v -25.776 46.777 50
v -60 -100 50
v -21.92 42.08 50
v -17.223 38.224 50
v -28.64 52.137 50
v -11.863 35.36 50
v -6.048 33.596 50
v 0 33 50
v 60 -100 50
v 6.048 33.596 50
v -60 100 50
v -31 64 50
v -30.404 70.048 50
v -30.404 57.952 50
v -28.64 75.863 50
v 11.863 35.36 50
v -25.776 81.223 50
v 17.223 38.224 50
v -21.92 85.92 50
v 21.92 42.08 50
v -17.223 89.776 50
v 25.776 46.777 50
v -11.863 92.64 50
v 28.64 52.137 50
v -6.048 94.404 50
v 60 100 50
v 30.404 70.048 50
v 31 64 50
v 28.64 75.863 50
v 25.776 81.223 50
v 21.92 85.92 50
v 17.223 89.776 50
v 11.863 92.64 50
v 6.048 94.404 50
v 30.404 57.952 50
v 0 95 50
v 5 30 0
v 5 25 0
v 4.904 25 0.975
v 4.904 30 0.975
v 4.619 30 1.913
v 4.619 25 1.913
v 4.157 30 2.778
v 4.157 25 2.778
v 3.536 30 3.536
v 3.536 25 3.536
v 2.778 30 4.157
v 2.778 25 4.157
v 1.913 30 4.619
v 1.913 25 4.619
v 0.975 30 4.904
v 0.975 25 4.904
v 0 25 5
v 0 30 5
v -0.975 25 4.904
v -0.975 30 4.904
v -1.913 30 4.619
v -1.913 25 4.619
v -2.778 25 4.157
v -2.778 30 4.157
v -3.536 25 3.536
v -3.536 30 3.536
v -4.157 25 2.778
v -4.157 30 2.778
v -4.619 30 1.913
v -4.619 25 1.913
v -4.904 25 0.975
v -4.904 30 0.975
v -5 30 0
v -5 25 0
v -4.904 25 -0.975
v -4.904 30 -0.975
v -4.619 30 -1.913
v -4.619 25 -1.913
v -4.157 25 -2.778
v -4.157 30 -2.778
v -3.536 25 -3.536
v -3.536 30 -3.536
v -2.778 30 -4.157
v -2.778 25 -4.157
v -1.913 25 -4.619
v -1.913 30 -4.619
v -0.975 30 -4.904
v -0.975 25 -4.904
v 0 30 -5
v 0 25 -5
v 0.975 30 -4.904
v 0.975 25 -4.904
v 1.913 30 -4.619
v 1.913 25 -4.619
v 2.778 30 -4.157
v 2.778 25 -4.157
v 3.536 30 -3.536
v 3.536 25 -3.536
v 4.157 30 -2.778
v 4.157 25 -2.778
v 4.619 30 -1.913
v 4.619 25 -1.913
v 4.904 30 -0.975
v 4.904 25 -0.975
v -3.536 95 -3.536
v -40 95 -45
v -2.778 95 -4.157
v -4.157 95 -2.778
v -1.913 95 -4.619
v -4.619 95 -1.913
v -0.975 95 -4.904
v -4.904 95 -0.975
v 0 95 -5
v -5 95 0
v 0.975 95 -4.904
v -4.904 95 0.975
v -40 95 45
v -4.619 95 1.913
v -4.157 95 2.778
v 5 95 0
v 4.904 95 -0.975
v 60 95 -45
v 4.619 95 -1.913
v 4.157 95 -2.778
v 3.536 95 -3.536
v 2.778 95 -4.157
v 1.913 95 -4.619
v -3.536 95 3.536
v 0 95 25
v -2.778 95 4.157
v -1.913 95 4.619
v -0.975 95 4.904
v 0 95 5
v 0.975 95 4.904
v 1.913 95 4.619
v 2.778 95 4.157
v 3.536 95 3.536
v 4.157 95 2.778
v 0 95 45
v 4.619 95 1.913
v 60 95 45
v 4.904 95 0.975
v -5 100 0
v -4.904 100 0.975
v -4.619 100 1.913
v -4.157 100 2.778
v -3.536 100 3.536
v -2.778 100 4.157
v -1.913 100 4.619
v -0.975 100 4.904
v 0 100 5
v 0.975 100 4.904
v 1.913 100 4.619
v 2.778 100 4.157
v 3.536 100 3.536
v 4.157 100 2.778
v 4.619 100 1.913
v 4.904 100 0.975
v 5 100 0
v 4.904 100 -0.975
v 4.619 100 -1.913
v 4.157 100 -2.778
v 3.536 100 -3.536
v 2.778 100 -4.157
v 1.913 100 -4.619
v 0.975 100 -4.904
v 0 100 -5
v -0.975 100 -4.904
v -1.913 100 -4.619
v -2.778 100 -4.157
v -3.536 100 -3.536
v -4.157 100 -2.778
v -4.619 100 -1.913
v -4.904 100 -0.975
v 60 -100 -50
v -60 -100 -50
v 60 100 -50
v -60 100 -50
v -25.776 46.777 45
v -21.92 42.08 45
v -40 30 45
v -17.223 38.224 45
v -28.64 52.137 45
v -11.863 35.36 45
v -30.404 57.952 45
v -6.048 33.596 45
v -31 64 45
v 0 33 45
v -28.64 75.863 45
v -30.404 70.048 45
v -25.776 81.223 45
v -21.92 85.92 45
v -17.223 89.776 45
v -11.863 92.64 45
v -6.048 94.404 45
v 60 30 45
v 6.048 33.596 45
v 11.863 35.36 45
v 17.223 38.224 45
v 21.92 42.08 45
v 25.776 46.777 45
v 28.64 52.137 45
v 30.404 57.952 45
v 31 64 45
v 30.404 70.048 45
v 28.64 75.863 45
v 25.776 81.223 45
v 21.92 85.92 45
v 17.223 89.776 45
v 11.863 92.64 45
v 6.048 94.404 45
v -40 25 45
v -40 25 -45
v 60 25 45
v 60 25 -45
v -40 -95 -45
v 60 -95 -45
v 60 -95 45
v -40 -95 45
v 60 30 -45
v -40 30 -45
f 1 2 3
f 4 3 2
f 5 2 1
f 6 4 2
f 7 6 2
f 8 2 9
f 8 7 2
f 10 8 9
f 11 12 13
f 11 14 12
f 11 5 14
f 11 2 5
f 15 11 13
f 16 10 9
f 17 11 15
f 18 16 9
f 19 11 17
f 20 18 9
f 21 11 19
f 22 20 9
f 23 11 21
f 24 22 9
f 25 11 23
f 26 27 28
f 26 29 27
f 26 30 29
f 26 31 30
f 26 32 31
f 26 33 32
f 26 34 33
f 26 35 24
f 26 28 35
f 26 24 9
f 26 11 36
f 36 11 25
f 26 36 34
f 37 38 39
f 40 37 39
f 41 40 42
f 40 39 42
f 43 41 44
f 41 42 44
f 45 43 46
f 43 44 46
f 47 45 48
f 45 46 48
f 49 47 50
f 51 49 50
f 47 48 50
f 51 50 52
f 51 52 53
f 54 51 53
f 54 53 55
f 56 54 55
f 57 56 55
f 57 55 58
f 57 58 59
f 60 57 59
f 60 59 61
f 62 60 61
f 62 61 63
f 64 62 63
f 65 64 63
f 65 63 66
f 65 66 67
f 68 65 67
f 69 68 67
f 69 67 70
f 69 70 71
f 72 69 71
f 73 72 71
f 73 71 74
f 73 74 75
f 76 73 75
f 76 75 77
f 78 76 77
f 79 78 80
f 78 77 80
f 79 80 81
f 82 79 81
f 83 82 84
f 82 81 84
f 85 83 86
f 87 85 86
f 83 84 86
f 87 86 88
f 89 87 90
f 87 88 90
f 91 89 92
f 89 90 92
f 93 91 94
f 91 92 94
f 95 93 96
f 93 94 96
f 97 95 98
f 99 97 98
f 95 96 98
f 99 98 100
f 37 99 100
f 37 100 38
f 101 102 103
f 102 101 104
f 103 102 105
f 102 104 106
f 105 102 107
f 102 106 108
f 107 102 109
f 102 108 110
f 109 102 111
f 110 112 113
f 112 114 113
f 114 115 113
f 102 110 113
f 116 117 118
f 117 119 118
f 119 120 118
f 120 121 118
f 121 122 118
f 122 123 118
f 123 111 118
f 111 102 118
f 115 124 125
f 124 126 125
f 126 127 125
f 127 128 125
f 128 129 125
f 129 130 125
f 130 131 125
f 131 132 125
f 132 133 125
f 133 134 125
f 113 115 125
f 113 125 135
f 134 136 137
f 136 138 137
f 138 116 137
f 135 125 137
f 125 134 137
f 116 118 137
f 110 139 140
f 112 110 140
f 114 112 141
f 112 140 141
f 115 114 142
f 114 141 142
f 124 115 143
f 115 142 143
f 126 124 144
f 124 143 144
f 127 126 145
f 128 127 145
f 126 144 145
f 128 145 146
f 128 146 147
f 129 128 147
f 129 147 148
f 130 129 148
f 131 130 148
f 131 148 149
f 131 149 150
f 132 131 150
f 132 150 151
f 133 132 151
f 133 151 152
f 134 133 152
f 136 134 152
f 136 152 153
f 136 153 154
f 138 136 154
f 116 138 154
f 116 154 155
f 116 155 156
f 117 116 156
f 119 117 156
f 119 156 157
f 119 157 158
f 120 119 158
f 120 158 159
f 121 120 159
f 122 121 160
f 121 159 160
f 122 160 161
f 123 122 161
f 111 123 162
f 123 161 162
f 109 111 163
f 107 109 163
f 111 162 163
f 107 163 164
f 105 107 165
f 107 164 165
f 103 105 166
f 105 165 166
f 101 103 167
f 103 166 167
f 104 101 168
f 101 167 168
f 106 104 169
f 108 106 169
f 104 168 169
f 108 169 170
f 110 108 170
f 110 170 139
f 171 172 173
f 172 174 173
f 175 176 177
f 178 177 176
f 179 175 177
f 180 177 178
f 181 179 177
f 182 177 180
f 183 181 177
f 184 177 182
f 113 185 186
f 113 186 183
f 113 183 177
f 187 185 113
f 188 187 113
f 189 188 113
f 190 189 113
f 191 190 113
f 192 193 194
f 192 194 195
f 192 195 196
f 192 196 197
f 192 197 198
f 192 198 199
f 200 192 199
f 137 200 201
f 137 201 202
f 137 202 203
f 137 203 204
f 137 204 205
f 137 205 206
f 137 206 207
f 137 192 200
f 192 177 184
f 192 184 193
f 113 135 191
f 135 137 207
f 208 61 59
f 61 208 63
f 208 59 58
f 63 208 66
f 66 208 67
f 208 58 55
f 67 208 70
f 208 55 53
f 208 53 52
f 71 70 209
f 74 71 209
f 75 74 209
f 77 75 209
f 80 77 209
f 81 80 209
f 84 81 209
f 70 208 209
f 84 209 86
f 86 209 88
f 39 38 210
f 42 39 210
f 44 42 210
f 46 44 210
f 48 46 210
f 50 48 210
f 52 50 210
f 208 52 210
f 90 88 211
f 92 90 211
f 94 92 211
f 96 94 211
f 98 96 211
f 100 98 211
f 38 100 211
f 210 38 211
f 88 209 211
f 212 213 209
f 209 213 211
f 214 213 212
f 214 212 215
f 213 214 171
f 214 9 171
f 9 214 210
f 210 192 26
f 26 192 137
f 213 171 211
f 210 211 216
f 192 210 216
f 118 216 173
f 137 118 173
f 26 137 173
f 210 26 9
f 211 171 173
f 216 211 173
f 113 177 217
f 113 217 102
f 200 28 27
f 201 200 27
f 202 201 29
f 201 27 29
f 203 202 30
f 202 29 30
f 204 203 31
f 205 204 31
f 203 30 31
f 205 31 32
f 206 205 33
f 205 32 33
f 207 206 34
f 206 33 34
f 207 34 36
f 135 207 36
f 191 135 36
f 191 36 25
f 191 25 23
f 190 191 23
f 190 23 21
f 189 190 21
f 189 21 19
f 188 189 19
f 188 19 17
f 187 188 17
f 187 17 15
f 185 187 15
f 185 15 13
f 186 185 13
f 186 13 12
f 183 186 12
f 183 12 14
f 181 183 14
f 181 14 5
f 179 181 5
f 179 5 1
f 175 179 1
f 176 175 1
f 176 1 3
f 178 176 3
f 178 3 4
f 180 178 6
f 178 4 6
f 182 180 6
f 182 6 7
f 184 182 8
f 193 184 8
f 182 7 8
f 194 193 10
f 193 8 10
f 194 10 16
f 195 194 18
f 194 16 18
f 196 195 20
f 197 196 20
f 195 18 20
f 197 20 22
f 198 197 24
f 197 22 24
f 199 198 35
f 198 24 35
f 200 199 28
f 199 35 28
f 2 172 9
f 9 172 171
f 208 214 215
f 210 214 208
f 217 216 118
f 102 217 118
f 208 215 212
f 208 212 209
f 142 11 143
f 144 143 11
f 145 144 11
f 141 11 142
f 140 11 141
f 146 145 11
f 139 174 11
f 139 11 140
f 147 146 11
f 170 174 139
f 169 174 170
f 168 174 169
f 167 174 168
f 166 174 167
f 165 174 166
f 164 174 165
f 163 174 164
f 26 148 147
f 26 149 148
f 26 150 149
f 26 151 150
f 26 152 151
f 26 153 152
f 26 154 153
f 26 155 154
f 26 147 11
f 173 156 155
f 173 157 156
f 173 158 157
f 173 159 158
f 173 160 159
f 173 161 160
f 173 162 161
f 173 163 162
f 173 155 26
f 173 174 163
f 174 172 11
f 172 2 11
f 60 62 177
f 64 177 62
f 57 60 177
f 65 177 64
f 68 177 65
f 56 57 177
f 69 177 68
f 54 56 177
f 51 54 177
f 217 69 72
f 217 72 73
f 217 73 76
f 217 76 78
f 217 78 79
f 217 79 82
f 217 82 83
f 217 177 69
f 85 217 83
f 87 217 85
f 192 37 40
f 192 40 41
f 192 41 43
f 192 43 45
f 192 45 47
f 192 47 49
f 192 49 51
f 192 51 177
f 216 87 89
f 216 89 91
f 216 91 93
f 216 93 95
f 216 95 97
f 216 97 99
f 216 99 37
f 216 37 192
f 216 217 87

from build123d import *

# Parameters (mm, degrees)
F0_W      = 120
F0_H      = 70
F0_H_2    = 5
F0_H_3    = 125
F1_DEPTH  = 50
F2_DEPTH  = 50
F3_W      = 190
F3_H      = 90
F4_DEPTH  = 100
F5_R      = 31
F6_DEPTH  = 25
F7_R      = 5
F8_DEPTH  = 25
F9_DEPTH  = 50
F10_DEPTH = 50
F11_R     = 5
F12_DEPTH = 25


with BuildPart() as f1:
    # F0 (on Top) → F1 (new body)
    with BuildSketch(Plane.XY):
        with Locations((0, 65)):
            Rectangle(F0_W, F0_H)
        with Locations((0, 27.5)):
            Rectangle(F0_W, F0_H_2)
        with Locations((0, -37.5)):
            Rectangle(F0_W, F0_H_3)
    extrude(amount=-F1_DEPTH)

    # F0 (on Top) → F2 (join)
    with BuildSketch(Plane.XY):
        with Locations((0, 65)):
            Rectangle(F0_W, F0_H)
        with Locations((0, 27.5)):
            Rectangle(F0_W, F0_H_2)
        with Locations((0, -37.5)):
            Rectangle(F0_W, F0_H_3)
    extrude(amount=F2_DEPTH)

    # F3 (on face) → F4 (cut)
    with BuildSketch(Plane.YZ.offset(60)):
        Rectangle(F3_W, F3_H)
    extrude(amount=-F4_DEPTH, mode=Mode.SUBTRACT)

    # F5 (on face) → F6 (cut)
    with BuildSketch(Plane.XY.offset(50)):
        with Locations((0, 64)):
            Circle(F5_R)
    extrude(amount=-F6_DEPTH, mode=Mode.SUBTRACT)

    # F7 (on face) → F8 (cut)
    with BuildSketch(Plane(origin=(0, 100, 0), x_dir=(-1, 0, 0), z_dir=(0, 1, 0))):
        Circle(F7_R)
    extrude(amount=-F8_DEPTH, mode=Mode.SUBTRACT)

    # F0 (on Top) → F9 (join)
    with BuildSketch(Plane.XY):
        with Locations((0, 27.5)):
            Rectangle(F0_W, F0_H_2)
    extrude(amount=F9_DEPTH)

    # F0 (on Top) → F10 (join)
    with BuildSketch(Plane.XY):
        with Locations((0, 27.5)):
            Rectangle(F0_W, F0_H_2)
    extrude(amount=-F10_DEPTH)

    # F11 (on face) → F12 (cut)
    with BuildSketch(Plane.XZ.offset(-25)):
        Circle(F11_R)
    extrude(amount=-F12_DEPTH, mode=Mode.SUBTRACT)


solid = f1.part
